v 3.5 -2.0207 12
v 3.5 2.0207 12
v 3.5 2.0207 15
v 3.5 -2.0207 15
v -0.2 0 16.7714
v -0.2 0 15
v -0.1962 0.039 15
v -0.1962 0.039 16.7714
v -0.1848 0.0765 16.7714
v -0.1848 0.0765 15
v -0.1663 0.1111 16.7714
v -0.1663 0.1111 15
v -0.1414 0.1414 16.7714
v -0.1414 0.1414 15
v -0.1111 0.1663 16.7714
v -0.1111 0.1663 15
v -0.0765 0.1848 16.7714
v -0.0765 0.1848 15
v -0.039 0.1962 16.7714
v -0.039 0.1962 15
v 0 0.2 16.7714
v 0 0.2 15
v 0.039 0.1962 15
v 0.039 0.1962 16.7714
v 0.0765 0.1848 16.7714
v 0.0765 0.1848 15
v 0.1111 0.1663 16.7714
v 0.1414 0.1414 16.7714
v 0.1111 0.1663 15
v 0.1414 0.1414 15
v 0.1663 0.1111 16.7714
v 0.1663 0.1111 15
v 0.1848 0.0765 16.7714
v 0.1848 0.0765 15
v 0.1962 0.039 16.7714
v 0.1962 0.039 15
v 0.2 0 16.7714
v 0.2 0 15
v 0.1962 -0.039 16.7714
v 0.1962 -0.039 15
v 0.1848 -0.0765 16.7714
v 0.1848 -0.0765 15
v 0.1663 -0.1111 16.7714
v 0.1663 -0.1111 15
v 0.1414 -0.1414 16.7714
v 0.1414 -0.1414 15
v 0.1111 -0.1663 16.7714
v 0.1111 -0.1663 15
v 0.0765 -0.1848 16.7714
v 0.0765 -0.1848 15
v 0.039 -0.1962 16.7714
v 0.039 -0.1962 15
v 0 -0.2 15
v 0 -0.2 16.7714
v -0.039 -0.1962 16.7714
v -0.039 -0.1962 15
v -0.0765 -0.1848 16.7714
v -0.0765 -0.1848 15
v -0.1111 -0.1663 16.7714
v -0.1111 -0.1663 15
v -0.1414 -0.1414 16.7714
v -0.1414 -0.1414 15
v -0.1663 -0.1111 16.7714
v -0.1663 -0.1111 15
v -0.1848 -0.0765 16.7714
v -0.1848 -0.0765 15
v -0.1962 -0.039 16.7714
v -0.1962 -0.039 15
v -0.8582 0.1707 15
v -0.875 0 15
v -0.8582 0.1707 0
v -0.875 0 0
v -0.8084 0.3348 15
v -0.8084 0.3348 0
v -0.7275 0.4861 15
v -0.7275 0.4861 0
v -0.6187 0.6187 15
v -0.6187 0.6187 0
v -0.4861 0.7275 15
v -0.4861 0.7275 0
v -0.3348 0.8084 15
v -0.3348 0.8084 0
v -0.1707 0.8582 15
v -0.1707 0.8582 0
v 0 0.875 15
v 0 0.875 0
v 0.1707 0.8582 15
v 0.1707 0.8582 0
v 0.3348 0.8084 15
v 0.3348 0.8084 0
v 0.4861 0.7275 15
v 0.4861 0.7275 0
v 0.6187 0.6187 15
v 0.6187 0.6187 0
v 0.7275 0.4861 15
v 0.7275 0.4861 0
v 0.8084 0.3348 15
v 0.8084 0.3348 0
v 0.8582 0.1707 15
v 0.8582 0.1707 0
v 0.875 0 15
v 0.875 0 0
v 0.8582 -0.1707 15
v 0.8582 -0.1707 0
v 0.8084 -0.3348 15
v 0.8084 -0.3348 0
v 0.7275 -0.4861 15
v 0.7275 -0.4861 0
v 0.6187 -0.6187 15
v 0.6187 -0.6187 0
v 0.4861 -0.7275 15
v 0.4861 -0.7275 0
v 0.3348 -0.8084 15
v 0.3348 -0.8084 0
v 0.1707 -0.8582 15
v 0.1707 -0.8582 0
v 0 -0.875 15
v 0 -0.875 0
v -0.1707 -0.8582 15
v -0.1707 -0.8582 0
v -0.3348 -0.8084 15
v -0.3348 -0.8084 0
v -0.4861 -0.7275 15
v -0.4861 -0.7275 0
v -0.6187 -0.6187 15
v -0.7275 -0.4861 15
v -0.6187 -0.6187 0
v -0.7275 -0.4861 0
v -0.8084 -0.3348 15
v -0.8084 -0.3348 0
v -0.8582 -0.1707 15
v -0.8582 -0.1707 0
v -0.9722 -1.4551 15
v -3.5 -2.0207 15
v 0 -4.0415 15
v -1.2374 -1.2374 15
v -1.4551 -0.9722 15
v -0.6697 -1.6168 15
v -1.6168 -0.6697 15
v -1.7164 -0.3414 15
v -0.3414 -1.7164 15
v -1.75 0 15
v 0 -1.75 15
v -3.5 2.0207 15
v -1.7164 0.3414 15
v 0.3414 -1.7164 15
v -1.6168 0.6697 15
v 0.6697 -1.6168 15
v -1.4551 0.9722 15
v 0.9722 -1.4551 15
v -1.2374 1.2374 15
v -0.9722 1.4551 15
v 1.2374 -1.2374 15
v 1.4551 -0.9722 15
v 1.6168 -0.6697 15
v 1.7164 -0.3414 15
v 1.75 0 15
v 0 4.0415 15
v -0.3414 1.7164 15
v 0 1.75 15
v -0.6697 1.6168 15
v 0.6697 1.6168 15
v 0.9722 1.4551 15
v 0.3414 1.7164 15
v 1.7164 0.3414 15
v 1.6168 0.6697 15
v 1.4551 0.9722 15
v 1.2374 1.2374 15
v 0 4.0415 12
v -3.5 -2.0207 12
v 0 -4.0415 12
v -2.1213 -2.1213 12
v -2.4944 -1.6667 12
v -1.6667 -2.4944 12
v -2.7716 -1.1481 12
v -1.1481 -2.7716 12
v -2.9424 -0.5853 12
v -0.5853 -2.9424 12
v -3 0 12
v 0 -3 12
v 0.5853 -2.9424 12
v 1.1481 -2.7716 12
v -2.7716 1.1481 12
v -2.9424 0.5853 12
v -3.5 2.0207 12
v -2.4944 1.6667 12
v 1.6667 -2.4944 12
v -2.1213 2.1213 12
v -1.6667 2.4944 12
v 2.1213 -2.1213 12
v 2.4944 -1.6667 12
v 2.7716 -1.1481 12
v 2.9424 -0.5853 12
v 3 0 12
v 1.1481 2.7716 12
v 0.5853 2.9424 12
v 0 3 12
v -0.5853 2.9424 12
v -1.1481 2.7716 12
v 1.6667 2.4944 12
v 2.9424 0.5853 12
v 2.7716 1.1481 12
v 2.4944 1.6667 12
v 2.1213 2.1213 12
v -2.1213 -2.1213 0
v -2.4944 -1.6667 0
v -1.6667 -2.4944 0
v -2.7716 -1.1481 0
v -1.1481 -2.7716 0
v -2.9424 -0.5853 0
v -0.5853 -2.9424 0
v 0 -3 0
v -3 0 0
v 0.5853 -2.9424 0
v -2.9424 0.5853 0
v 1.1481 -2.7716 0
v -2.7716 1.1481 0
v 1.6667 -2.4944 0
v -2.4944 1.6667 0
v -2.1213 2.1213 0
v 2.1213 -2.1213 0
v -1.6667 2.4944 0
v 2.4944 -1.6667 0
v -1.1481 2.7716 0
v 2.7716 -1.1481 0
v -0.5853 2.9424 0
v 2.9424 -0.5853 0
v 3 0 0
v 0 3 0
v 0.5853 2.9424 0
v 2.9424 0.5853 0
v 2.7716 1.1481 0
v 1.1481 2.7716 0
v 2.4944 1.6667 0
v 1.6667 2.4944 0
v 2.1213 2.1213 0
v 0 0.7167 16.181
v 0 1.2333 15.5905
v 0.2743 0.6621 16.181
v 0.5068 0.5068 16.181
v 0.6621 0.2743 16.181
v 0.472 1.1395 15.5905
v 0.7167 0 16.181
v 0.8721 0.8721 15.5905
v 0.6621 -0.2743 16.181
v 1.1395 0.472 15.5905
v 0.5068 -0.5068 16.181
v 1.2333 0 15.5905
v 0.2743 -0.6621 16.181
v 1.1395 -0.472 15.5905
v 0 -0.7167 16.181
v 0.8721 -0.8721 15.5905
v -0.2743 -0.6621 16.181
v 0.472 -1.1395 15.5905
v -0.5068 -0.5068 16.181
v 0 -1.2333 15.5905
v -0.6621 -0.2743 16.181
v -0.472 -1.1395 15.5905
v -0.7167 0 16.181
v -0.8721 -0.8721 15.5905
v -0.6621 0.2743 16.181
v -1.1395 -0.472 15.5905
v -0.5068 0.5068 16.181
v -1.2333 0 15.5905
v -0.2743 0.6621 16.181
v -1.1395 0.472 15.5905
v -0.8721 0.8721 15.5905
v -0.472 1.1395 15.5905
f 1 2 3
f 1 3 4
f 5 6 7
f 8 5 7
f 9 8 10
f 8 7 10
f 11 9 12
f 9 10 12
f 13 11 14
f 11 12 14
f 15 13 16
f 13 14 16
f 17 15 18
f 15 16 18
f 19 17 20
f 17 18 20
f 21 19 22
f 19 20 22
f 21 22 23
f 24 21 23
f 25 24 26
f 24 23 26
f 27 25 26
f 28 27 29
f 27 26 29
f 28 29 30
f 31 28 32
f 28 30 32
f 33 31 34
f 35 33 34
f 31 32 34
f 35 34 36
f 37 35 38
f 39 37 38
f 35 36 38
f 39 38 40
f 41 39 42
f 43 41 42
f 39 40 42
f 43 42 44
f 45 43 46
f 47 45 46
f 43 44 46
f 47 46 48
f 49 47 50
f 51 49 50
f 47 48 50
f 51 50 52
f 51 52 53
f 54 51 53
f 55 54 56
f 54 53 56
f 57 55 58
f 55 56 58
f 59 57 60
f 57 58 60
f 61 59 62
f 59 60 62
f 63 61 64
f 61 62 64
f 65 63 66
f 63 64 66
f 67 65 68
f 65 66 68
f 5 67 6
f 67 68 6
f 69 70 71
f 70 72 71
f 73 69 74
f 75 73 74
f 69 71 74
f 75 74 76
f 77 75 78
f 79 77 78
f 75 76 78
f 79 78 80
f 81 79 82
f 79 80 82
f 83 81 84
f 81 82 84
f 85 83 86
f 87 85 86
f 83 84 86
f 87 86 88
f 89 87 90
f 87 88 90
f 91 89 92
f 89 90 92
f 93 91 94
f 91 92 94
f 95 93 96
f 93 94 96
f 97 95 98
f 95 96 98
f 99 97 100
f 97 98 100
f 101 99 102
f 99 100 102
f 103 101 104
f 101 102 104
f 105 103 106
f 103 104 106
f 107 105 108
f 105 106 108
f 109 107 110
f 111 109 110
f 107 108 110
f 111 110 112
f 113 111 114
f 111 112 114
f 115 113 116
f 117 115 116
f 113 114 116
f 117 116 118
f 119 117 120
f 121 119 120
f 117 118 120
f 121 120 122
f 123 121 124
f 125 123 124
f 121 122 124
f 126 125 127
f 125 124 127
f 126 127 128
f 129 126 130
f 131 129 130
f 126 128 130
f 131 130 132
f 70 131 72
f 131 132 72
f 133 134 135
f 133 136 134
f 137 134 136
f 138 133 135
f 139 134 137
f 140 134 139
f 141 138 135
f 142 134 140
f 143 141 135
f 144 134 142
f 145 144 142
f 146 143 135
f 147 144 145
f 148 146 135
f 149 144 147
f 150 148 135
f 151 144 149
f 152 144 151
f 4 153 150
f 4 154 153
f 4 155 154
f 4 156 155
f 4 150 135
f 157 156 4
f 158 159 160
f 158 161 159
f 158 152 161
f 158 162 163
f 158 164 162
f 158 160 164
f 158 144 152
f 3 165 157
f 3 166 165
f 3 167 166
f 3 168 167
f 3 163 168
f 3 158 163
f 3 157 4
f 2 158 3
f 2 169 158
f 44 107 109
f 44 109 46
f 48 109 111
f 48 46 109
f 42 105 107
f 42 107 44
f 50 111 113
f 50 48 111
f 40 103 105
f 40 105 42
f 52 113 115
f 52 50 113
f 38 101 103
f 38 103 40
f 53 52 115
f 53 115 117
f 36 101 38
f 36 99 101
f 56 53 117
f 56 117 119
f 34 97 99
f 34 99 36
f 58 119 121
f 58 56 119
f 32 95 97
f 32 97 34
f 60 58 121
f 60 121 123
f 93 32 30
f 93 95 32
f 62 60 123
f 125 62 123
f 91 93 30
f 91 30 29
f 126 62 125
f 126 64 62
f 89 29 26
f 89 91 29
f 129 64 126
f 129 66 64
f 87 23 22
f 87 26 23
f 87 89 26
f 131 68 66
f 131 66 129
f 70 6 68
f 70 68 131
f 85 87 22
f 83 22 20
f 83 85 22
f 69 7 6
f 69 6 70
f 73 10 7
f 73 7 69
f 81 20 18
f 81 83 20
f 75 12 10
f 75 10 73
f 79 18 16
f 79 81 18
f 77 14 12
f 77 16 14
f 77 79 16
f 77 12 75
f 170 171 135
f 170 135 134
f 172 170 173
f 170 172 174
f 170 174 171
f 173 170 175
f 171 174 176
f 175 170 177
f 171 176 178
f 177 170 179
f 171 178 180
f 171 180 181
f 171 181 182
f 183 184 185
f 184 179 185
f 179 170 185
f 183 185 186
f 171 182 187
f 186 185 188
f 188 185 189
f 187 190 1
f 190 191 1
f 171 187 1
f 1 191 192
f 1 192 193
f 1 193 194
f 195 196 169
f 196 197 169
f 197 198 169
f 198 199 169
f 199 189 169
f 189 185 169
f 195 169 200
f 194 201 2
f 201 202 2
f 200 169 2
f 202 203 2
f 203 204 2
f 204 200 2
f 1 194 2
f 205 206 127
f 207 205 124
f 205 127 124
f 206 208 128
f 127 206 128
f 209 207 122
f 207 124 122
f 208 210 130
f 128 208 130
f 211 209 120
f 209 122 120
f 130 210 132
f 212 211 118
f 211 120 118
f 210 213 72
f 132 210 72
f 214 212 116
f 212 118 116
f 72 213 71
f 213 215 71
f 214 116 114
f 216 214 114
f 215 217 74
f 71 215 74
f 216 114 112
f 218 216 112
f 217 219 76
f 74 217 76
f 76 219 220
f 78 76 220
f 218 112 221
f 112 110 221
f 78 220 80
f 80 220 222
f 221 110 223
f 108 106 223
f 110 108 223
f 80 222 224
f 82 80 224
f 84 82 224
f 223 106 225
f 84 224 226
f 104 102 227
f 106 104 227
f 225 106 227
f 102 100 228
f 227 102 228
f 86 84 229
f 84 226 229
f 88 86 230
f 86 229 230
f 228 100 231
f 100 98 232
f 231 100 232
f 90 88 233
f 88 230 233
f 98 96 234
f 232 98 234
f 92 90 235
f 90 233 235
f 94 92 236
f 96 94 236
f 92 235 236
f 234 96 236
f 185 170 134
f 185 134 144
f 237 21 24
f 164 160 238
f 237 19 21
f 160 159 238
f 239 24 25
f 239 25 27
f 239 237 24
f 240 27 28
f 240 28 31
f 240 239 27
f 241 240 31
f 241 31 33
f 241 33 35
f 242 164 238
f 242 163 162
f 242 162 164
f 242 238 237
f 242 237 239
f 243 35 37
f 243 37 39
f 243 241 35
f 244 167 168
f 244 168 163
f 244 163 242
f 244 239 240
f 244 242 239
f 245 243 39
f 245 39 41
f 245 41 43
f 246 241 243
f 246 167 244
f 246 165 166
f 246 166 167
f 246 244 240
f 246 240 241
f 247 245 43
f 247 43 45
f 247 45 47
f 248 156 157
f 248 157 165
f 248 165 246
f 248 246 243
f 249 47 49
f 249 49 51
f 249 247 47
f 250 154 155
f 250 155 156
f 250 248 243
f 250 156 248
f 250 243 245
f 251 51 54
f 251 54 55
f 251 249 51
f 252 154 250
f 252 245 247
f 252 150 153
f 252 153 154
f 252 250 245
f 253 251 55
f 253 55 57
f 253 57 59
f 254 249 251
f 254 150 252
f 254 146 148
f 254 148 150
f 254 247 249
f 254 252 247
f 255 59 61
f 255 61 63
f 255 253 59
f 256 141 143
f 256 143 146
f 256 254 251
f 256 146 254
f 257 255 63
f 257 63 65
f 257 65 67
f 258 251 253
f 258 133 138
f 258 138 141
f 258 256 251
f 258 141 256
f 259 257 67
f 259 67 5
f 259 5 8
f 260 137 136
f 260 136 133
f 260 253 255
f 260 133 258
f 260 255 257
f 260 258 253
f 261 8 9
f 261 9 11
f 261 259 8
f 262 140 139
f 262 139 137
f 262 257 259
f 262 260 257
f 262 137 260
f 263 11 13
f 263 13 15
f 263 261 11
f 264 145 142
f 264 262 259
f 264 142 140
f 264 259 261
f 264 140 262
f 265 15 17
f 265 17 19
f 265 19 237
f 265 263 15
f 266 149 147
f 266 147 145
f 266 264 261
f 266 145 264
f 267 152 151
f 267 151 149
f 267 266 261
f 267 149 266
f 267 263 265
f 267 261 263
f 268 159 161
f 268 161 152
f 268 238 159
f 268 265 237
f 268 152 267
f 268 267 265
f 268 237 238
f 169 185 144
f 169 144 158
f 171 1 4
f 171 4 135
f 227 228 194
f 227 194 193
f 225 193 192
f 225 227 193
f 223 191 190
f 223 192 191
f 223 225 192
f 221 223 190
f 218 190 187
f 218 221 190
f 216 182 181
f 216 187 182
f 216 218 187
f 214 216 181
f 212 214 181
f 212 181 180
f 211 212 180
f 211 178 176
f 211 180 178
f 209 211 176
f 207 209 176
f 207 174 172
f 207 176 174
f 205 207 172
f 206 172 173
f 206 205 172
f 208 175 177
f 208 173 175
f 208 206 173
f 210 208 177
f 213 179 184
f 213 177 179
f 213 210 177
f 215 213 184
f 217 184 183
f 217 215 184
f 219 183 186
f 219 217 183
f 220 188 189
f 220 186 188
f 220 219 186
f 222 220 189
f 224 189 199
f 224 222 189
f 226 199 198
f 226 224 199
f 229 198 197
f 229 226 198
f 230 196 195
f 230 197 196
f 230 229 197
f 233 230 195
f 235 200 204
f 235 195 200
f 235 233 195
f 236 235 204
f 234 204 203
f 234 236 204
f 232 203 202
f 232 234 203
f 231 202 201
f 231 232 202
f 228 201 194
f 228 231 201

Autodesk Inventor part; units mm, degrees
ref_plane "YZ Plane" through (0, 0, 0) normal (1, 0, 0) x (0, 1, 0)
ref_plane "XZ Plane" through (0, 0, 0) normal (0, 1, 0) x (-1, 0, 0)
sketch "Sketch1" plane through (0, 0, 0) normal (0, 0, 1) x (1, 0, 0)
  circle A0 centre (0, 0) radius 3
  dimension "d0" = 6
extrude "Extrusion1" add sketch "Sketch1" along normal blind 12
sketch "Sketch2" plane through (0, 0, 12) normal (0, 0, 1) x (1, 0, 0)
  line L0 (3.5, -2.0207) -> (0, -4.0415)
  line L1 (0, -4.0415) -> (-3.5, -2.0207)
  line L2 (-3.5, -2.0207) -> (-3.5, 2.0207)
  line L3 (-3.5, 2.0207) -> (0, 4.0415)
  line L4 (0, 4.0415) -> (3.5, 2.0207)
  line L5 (3.5, 2.0207) -> (3.5, -2.0207)
  point P0 (0, 0)
  point P1 (0, 0)
  dimension "d3" = 7
extrude "Extrusion2" add sketch "Sketch2" along normal blind 3
sketch "Sketch3" plane through (3.5, -2.0207, 12) normal (1, 0, 0) x (0, 0, -1)
  line L0 (12, 2.0207) -> (-9.0637, 2.0207) construction
  line L1 (-5, 2.0207) -> (-3, 3.7707)
  line L2 (-3, 0) -> (-3, 4.0415) projected
  dimension "d6" = 2
  dimension "d7" = 1.75
ref_plane "Work Plane1" through (0, 4.0415, 15) normal (1, 0, 0) x (0, 1, 0)
sketch "Sketch4" plane through (0, 4.0415, 15) normal (1, 0, 0) x (0, 1, 0)
  line L0 (-4.0415, -15) -> (-4.0415, 0)
  line L1 (-4.0415, 2) -> (-2.2915, 0)
  line L2 (-6.0622, 0) -> (-2.0207, 0) projected
  line L3 (-4.0415, 2) -> (-4.0415, 9.3092)
  line L4 (-4.0415, 0) -> (-4.0415, 2)
  line L5 (-2.2915, 0) -> (-4.0415, 0)
  dimension "d8" = 1.75
  dimension "d9" = 2
revolve "Revolution1" add sketch "Sketch4" angle 360 about axis through (0, 0, 17) along (0, 0, 1)
sketch "Sketch5" plane through (0, 0, 0) normal (0, 0, -1) x (-1, 0, 0)
  circle A0 centre (0, 0) radius 0.875
  dimension "d11" = 1.75
extrude "Extrusion3" cut sketch "Sketch5" against normal blind 15
sketch "Sketch6" plane through (0, 0, 15) normal (0, 0, -1) x (-1, 0, 0)
  circle A0 centre (0, 0) radius 0.2
  dimension "d14" = 0.4
extrude "Extrusion4" cut sketch "Sketch6" against normal through all
thread "Thread1" size "M6x1" class "6g" standard "ANSI Metric M Profile" full length
properties part number "nozzle"
